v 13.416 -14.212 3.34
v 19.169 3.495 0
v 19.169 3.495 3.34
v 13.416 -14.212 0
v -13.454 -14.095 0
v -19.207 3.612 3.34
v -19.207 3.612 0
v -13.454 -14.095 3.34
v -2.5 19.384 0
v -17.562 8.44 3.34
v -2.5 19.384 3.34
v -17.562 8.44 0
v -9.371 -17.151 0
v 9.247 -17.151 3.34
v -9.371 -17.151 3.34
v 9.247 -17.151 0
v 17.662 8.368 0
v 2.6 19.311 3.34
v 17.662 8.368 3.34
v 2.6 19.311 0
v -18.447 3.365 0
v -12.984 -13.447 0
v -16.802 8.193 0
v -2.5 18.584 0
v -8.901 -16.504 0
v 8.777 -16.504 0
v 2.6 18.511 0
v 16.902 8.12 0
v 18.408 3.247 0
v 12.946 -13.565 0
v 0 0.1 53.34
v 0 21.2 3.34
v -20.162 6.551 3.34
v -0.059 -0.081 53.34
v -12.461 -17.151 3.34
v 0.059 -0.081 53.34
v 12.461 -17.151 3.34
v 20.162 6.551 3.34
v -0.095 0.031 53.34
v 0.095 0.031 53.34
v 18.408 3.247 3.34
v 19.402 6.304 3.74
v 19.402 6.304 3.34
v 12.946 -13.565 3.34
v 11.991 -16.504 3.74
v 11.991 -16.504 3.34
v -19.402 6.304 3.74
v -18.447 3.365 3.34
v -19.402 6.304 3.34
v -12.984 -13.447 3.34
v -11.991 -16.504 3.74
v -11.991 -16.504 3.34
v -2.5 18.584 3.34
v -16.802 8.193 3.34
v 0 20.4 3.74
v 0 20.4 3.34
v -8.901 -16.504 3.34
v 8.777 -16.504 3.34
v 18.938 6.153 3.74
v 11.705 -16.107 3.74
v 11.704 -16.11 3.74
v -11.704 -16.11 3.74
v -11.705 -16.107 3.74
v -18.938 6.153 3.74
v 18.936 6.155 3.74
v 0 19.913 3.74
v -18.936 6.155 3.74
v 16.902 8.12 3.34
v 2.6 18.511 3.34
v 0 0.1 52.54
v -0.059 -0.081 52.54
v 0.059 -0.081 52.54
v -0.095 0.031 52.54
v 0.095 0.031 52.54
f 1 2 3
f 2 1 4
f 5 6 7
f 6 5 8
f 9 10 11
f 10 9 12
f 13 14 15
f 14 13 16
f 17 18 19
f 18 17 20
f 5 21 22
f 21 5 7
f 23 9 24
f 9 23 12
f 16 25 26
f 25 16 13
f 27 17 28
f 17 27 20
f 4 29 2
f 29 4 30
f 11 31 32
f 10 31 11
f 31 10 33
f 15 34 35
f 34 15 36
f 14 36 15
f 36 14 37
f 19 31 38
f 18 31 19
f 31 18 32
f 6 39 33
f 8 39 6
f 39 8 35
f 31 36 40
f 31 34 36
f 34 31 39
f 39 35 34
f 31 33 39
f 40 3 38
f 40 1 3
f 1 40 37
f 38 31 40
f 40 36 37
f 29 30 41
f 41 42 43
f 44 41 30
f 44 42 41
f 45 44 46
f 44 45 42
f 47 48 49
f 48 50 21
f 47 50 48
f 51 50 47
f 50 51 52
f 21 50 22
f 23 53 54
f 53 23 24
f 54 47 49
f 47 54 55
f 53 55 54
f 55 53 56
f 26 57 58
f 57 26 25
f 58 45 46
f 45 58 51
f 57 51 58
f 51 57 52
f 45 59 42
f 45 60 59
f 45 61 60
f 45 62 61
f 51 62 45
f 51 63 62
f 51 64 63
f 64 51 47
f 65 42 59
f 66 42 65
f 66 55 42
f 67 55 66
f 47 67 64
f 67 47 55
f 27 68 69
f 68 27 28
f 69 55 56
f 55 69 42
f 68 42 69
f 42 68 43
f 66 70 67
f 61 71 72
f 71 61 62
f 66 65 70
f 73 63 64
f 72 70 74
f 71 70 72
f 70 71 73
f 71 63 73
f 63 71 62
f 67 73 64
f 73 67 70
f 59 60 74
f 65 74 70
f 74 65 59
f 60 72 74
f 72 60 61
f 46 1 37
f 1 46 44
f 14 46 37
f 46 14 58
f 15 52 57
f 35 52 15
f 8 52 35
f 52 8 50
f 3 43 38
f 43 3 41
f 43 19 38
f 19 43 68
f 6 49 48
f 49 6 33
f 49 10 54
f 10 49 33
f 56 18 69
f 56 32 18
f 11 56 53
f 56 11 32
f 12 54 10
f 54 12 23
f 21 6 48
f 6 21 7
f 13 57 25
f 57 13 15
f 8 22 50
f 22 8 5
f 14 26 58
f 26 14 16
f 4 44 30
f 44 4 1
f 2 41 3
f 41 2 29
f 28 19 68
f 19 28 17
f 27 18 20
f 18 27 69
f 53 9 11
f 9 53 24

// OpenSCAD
/*
OpenSCAD sketch to generate snap-fit spikes for BlinkyTiles!
Coded by Ben Rockhold in Sept 2014
No rights reserved.

*/

/* [Parameters] */
// This makes the cone taller! Note; values smaller than ~30 may not be printable.
CrystalHeight = 50;
// Radius of the cone point, just in case you don't want a cone.
ConePoint = 0.1;
// This is the wall thickness of the cone -- note, my math is broken.
WallThickness = 0.8;
// Used to tune the snap-fit
PrintTolerance = 0.1; 

/* [Tile Constants] */
// Probably should not change these, but here they are.
// The cylinder needs to become defined by the tangents of a regular pentagon that is ~30.9mm to a side
PentaRadius = 21.2;
ClipLength = 1.67*2;
LegWidth = 5;


difference(){
	rotate([0,0,90])union(){
		cylinder(r=PentaRadius,h=ClipLength,$fn=5);
		translate([0,0,ClipLength])
			cylinder(r1=PentaRadius,r2=ConePoint,h=CrystalHeight,$fn=5);
	}
	// shelling the cylinder; vertical translation used for wall thickness -- yes, I know...
	rotate([0,0,90]){
		translate([0,0,-0.1])cylinder(r=PentaRadius-WallThickness,h=ClipLength+0.5,$fn=5);
		translate([0,0,ClipLength-WallThickness])
			cylinder(r1=PentaRadius-WallThickness,r2=ConePoint,h=CrystalHeight,$fn=5);
	}
	for(i=[1:5]){
		rotate([0,0,i*(360/5)])
			translate([-LegWidth/2,0,-0.1])
				cube([LegWidth+PrintTolerance,PentaRadius*2,ClipLength+0.1]);
	}
}
//%cylinder(r=PentaRadius,h=5,$fn=50);
